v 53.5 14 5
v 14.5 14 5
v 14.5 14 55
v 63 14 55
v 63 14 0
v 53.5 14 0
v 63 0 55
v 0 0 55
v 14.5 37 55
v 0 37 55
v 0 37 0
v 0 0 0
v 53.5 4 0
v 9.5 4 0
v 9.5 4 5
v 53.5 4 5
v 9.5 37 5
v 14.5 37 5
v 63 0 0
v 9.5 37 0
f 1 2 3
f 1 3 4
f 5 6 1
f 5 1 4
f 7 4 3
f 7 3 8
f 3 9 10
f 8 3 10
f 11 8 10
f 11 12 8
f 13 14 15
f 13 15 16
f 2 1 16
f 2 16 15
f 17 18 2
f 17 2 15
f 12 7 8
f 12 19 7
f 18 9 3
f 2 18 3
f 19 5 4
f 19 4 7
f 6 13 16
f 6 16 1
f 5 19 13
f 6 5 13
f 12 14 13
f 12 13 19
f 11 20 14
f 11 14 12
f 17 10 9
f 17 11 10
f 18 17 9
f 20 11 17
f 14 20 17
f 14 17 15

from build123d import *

# Parameters (mm, degrees)
BOSS_EXTRUDE1_DEPTH = 5
BOSS_EXTRUDE3_DEPTH = 50


with BuildPart() as part:
    # Sketch1 → Boss-Extrude1 (new body)
    with BuildSketch(Plane.XY):
        Polygon((0, 0), (0, 37), (9.5, 37), (9.5, 4), (53.5, 4), (53.5, 14), (63, 14), (63, 0), align=None)
    extrude(amount=BOSS_EXTRUDE1_DEPTH)

    # Sketch2 → Boss-Extrude3 (add)
    with BuildSketch(Plane.XY.offset(5)):
        Polygon((0, 37), (14.5, 37), (14.5, 14), (63, 14), (63, 0), (0, 0), align=None)
    extrude(amount=BOSS_EXTRUDE3_DEPTH)


solid = part.part
